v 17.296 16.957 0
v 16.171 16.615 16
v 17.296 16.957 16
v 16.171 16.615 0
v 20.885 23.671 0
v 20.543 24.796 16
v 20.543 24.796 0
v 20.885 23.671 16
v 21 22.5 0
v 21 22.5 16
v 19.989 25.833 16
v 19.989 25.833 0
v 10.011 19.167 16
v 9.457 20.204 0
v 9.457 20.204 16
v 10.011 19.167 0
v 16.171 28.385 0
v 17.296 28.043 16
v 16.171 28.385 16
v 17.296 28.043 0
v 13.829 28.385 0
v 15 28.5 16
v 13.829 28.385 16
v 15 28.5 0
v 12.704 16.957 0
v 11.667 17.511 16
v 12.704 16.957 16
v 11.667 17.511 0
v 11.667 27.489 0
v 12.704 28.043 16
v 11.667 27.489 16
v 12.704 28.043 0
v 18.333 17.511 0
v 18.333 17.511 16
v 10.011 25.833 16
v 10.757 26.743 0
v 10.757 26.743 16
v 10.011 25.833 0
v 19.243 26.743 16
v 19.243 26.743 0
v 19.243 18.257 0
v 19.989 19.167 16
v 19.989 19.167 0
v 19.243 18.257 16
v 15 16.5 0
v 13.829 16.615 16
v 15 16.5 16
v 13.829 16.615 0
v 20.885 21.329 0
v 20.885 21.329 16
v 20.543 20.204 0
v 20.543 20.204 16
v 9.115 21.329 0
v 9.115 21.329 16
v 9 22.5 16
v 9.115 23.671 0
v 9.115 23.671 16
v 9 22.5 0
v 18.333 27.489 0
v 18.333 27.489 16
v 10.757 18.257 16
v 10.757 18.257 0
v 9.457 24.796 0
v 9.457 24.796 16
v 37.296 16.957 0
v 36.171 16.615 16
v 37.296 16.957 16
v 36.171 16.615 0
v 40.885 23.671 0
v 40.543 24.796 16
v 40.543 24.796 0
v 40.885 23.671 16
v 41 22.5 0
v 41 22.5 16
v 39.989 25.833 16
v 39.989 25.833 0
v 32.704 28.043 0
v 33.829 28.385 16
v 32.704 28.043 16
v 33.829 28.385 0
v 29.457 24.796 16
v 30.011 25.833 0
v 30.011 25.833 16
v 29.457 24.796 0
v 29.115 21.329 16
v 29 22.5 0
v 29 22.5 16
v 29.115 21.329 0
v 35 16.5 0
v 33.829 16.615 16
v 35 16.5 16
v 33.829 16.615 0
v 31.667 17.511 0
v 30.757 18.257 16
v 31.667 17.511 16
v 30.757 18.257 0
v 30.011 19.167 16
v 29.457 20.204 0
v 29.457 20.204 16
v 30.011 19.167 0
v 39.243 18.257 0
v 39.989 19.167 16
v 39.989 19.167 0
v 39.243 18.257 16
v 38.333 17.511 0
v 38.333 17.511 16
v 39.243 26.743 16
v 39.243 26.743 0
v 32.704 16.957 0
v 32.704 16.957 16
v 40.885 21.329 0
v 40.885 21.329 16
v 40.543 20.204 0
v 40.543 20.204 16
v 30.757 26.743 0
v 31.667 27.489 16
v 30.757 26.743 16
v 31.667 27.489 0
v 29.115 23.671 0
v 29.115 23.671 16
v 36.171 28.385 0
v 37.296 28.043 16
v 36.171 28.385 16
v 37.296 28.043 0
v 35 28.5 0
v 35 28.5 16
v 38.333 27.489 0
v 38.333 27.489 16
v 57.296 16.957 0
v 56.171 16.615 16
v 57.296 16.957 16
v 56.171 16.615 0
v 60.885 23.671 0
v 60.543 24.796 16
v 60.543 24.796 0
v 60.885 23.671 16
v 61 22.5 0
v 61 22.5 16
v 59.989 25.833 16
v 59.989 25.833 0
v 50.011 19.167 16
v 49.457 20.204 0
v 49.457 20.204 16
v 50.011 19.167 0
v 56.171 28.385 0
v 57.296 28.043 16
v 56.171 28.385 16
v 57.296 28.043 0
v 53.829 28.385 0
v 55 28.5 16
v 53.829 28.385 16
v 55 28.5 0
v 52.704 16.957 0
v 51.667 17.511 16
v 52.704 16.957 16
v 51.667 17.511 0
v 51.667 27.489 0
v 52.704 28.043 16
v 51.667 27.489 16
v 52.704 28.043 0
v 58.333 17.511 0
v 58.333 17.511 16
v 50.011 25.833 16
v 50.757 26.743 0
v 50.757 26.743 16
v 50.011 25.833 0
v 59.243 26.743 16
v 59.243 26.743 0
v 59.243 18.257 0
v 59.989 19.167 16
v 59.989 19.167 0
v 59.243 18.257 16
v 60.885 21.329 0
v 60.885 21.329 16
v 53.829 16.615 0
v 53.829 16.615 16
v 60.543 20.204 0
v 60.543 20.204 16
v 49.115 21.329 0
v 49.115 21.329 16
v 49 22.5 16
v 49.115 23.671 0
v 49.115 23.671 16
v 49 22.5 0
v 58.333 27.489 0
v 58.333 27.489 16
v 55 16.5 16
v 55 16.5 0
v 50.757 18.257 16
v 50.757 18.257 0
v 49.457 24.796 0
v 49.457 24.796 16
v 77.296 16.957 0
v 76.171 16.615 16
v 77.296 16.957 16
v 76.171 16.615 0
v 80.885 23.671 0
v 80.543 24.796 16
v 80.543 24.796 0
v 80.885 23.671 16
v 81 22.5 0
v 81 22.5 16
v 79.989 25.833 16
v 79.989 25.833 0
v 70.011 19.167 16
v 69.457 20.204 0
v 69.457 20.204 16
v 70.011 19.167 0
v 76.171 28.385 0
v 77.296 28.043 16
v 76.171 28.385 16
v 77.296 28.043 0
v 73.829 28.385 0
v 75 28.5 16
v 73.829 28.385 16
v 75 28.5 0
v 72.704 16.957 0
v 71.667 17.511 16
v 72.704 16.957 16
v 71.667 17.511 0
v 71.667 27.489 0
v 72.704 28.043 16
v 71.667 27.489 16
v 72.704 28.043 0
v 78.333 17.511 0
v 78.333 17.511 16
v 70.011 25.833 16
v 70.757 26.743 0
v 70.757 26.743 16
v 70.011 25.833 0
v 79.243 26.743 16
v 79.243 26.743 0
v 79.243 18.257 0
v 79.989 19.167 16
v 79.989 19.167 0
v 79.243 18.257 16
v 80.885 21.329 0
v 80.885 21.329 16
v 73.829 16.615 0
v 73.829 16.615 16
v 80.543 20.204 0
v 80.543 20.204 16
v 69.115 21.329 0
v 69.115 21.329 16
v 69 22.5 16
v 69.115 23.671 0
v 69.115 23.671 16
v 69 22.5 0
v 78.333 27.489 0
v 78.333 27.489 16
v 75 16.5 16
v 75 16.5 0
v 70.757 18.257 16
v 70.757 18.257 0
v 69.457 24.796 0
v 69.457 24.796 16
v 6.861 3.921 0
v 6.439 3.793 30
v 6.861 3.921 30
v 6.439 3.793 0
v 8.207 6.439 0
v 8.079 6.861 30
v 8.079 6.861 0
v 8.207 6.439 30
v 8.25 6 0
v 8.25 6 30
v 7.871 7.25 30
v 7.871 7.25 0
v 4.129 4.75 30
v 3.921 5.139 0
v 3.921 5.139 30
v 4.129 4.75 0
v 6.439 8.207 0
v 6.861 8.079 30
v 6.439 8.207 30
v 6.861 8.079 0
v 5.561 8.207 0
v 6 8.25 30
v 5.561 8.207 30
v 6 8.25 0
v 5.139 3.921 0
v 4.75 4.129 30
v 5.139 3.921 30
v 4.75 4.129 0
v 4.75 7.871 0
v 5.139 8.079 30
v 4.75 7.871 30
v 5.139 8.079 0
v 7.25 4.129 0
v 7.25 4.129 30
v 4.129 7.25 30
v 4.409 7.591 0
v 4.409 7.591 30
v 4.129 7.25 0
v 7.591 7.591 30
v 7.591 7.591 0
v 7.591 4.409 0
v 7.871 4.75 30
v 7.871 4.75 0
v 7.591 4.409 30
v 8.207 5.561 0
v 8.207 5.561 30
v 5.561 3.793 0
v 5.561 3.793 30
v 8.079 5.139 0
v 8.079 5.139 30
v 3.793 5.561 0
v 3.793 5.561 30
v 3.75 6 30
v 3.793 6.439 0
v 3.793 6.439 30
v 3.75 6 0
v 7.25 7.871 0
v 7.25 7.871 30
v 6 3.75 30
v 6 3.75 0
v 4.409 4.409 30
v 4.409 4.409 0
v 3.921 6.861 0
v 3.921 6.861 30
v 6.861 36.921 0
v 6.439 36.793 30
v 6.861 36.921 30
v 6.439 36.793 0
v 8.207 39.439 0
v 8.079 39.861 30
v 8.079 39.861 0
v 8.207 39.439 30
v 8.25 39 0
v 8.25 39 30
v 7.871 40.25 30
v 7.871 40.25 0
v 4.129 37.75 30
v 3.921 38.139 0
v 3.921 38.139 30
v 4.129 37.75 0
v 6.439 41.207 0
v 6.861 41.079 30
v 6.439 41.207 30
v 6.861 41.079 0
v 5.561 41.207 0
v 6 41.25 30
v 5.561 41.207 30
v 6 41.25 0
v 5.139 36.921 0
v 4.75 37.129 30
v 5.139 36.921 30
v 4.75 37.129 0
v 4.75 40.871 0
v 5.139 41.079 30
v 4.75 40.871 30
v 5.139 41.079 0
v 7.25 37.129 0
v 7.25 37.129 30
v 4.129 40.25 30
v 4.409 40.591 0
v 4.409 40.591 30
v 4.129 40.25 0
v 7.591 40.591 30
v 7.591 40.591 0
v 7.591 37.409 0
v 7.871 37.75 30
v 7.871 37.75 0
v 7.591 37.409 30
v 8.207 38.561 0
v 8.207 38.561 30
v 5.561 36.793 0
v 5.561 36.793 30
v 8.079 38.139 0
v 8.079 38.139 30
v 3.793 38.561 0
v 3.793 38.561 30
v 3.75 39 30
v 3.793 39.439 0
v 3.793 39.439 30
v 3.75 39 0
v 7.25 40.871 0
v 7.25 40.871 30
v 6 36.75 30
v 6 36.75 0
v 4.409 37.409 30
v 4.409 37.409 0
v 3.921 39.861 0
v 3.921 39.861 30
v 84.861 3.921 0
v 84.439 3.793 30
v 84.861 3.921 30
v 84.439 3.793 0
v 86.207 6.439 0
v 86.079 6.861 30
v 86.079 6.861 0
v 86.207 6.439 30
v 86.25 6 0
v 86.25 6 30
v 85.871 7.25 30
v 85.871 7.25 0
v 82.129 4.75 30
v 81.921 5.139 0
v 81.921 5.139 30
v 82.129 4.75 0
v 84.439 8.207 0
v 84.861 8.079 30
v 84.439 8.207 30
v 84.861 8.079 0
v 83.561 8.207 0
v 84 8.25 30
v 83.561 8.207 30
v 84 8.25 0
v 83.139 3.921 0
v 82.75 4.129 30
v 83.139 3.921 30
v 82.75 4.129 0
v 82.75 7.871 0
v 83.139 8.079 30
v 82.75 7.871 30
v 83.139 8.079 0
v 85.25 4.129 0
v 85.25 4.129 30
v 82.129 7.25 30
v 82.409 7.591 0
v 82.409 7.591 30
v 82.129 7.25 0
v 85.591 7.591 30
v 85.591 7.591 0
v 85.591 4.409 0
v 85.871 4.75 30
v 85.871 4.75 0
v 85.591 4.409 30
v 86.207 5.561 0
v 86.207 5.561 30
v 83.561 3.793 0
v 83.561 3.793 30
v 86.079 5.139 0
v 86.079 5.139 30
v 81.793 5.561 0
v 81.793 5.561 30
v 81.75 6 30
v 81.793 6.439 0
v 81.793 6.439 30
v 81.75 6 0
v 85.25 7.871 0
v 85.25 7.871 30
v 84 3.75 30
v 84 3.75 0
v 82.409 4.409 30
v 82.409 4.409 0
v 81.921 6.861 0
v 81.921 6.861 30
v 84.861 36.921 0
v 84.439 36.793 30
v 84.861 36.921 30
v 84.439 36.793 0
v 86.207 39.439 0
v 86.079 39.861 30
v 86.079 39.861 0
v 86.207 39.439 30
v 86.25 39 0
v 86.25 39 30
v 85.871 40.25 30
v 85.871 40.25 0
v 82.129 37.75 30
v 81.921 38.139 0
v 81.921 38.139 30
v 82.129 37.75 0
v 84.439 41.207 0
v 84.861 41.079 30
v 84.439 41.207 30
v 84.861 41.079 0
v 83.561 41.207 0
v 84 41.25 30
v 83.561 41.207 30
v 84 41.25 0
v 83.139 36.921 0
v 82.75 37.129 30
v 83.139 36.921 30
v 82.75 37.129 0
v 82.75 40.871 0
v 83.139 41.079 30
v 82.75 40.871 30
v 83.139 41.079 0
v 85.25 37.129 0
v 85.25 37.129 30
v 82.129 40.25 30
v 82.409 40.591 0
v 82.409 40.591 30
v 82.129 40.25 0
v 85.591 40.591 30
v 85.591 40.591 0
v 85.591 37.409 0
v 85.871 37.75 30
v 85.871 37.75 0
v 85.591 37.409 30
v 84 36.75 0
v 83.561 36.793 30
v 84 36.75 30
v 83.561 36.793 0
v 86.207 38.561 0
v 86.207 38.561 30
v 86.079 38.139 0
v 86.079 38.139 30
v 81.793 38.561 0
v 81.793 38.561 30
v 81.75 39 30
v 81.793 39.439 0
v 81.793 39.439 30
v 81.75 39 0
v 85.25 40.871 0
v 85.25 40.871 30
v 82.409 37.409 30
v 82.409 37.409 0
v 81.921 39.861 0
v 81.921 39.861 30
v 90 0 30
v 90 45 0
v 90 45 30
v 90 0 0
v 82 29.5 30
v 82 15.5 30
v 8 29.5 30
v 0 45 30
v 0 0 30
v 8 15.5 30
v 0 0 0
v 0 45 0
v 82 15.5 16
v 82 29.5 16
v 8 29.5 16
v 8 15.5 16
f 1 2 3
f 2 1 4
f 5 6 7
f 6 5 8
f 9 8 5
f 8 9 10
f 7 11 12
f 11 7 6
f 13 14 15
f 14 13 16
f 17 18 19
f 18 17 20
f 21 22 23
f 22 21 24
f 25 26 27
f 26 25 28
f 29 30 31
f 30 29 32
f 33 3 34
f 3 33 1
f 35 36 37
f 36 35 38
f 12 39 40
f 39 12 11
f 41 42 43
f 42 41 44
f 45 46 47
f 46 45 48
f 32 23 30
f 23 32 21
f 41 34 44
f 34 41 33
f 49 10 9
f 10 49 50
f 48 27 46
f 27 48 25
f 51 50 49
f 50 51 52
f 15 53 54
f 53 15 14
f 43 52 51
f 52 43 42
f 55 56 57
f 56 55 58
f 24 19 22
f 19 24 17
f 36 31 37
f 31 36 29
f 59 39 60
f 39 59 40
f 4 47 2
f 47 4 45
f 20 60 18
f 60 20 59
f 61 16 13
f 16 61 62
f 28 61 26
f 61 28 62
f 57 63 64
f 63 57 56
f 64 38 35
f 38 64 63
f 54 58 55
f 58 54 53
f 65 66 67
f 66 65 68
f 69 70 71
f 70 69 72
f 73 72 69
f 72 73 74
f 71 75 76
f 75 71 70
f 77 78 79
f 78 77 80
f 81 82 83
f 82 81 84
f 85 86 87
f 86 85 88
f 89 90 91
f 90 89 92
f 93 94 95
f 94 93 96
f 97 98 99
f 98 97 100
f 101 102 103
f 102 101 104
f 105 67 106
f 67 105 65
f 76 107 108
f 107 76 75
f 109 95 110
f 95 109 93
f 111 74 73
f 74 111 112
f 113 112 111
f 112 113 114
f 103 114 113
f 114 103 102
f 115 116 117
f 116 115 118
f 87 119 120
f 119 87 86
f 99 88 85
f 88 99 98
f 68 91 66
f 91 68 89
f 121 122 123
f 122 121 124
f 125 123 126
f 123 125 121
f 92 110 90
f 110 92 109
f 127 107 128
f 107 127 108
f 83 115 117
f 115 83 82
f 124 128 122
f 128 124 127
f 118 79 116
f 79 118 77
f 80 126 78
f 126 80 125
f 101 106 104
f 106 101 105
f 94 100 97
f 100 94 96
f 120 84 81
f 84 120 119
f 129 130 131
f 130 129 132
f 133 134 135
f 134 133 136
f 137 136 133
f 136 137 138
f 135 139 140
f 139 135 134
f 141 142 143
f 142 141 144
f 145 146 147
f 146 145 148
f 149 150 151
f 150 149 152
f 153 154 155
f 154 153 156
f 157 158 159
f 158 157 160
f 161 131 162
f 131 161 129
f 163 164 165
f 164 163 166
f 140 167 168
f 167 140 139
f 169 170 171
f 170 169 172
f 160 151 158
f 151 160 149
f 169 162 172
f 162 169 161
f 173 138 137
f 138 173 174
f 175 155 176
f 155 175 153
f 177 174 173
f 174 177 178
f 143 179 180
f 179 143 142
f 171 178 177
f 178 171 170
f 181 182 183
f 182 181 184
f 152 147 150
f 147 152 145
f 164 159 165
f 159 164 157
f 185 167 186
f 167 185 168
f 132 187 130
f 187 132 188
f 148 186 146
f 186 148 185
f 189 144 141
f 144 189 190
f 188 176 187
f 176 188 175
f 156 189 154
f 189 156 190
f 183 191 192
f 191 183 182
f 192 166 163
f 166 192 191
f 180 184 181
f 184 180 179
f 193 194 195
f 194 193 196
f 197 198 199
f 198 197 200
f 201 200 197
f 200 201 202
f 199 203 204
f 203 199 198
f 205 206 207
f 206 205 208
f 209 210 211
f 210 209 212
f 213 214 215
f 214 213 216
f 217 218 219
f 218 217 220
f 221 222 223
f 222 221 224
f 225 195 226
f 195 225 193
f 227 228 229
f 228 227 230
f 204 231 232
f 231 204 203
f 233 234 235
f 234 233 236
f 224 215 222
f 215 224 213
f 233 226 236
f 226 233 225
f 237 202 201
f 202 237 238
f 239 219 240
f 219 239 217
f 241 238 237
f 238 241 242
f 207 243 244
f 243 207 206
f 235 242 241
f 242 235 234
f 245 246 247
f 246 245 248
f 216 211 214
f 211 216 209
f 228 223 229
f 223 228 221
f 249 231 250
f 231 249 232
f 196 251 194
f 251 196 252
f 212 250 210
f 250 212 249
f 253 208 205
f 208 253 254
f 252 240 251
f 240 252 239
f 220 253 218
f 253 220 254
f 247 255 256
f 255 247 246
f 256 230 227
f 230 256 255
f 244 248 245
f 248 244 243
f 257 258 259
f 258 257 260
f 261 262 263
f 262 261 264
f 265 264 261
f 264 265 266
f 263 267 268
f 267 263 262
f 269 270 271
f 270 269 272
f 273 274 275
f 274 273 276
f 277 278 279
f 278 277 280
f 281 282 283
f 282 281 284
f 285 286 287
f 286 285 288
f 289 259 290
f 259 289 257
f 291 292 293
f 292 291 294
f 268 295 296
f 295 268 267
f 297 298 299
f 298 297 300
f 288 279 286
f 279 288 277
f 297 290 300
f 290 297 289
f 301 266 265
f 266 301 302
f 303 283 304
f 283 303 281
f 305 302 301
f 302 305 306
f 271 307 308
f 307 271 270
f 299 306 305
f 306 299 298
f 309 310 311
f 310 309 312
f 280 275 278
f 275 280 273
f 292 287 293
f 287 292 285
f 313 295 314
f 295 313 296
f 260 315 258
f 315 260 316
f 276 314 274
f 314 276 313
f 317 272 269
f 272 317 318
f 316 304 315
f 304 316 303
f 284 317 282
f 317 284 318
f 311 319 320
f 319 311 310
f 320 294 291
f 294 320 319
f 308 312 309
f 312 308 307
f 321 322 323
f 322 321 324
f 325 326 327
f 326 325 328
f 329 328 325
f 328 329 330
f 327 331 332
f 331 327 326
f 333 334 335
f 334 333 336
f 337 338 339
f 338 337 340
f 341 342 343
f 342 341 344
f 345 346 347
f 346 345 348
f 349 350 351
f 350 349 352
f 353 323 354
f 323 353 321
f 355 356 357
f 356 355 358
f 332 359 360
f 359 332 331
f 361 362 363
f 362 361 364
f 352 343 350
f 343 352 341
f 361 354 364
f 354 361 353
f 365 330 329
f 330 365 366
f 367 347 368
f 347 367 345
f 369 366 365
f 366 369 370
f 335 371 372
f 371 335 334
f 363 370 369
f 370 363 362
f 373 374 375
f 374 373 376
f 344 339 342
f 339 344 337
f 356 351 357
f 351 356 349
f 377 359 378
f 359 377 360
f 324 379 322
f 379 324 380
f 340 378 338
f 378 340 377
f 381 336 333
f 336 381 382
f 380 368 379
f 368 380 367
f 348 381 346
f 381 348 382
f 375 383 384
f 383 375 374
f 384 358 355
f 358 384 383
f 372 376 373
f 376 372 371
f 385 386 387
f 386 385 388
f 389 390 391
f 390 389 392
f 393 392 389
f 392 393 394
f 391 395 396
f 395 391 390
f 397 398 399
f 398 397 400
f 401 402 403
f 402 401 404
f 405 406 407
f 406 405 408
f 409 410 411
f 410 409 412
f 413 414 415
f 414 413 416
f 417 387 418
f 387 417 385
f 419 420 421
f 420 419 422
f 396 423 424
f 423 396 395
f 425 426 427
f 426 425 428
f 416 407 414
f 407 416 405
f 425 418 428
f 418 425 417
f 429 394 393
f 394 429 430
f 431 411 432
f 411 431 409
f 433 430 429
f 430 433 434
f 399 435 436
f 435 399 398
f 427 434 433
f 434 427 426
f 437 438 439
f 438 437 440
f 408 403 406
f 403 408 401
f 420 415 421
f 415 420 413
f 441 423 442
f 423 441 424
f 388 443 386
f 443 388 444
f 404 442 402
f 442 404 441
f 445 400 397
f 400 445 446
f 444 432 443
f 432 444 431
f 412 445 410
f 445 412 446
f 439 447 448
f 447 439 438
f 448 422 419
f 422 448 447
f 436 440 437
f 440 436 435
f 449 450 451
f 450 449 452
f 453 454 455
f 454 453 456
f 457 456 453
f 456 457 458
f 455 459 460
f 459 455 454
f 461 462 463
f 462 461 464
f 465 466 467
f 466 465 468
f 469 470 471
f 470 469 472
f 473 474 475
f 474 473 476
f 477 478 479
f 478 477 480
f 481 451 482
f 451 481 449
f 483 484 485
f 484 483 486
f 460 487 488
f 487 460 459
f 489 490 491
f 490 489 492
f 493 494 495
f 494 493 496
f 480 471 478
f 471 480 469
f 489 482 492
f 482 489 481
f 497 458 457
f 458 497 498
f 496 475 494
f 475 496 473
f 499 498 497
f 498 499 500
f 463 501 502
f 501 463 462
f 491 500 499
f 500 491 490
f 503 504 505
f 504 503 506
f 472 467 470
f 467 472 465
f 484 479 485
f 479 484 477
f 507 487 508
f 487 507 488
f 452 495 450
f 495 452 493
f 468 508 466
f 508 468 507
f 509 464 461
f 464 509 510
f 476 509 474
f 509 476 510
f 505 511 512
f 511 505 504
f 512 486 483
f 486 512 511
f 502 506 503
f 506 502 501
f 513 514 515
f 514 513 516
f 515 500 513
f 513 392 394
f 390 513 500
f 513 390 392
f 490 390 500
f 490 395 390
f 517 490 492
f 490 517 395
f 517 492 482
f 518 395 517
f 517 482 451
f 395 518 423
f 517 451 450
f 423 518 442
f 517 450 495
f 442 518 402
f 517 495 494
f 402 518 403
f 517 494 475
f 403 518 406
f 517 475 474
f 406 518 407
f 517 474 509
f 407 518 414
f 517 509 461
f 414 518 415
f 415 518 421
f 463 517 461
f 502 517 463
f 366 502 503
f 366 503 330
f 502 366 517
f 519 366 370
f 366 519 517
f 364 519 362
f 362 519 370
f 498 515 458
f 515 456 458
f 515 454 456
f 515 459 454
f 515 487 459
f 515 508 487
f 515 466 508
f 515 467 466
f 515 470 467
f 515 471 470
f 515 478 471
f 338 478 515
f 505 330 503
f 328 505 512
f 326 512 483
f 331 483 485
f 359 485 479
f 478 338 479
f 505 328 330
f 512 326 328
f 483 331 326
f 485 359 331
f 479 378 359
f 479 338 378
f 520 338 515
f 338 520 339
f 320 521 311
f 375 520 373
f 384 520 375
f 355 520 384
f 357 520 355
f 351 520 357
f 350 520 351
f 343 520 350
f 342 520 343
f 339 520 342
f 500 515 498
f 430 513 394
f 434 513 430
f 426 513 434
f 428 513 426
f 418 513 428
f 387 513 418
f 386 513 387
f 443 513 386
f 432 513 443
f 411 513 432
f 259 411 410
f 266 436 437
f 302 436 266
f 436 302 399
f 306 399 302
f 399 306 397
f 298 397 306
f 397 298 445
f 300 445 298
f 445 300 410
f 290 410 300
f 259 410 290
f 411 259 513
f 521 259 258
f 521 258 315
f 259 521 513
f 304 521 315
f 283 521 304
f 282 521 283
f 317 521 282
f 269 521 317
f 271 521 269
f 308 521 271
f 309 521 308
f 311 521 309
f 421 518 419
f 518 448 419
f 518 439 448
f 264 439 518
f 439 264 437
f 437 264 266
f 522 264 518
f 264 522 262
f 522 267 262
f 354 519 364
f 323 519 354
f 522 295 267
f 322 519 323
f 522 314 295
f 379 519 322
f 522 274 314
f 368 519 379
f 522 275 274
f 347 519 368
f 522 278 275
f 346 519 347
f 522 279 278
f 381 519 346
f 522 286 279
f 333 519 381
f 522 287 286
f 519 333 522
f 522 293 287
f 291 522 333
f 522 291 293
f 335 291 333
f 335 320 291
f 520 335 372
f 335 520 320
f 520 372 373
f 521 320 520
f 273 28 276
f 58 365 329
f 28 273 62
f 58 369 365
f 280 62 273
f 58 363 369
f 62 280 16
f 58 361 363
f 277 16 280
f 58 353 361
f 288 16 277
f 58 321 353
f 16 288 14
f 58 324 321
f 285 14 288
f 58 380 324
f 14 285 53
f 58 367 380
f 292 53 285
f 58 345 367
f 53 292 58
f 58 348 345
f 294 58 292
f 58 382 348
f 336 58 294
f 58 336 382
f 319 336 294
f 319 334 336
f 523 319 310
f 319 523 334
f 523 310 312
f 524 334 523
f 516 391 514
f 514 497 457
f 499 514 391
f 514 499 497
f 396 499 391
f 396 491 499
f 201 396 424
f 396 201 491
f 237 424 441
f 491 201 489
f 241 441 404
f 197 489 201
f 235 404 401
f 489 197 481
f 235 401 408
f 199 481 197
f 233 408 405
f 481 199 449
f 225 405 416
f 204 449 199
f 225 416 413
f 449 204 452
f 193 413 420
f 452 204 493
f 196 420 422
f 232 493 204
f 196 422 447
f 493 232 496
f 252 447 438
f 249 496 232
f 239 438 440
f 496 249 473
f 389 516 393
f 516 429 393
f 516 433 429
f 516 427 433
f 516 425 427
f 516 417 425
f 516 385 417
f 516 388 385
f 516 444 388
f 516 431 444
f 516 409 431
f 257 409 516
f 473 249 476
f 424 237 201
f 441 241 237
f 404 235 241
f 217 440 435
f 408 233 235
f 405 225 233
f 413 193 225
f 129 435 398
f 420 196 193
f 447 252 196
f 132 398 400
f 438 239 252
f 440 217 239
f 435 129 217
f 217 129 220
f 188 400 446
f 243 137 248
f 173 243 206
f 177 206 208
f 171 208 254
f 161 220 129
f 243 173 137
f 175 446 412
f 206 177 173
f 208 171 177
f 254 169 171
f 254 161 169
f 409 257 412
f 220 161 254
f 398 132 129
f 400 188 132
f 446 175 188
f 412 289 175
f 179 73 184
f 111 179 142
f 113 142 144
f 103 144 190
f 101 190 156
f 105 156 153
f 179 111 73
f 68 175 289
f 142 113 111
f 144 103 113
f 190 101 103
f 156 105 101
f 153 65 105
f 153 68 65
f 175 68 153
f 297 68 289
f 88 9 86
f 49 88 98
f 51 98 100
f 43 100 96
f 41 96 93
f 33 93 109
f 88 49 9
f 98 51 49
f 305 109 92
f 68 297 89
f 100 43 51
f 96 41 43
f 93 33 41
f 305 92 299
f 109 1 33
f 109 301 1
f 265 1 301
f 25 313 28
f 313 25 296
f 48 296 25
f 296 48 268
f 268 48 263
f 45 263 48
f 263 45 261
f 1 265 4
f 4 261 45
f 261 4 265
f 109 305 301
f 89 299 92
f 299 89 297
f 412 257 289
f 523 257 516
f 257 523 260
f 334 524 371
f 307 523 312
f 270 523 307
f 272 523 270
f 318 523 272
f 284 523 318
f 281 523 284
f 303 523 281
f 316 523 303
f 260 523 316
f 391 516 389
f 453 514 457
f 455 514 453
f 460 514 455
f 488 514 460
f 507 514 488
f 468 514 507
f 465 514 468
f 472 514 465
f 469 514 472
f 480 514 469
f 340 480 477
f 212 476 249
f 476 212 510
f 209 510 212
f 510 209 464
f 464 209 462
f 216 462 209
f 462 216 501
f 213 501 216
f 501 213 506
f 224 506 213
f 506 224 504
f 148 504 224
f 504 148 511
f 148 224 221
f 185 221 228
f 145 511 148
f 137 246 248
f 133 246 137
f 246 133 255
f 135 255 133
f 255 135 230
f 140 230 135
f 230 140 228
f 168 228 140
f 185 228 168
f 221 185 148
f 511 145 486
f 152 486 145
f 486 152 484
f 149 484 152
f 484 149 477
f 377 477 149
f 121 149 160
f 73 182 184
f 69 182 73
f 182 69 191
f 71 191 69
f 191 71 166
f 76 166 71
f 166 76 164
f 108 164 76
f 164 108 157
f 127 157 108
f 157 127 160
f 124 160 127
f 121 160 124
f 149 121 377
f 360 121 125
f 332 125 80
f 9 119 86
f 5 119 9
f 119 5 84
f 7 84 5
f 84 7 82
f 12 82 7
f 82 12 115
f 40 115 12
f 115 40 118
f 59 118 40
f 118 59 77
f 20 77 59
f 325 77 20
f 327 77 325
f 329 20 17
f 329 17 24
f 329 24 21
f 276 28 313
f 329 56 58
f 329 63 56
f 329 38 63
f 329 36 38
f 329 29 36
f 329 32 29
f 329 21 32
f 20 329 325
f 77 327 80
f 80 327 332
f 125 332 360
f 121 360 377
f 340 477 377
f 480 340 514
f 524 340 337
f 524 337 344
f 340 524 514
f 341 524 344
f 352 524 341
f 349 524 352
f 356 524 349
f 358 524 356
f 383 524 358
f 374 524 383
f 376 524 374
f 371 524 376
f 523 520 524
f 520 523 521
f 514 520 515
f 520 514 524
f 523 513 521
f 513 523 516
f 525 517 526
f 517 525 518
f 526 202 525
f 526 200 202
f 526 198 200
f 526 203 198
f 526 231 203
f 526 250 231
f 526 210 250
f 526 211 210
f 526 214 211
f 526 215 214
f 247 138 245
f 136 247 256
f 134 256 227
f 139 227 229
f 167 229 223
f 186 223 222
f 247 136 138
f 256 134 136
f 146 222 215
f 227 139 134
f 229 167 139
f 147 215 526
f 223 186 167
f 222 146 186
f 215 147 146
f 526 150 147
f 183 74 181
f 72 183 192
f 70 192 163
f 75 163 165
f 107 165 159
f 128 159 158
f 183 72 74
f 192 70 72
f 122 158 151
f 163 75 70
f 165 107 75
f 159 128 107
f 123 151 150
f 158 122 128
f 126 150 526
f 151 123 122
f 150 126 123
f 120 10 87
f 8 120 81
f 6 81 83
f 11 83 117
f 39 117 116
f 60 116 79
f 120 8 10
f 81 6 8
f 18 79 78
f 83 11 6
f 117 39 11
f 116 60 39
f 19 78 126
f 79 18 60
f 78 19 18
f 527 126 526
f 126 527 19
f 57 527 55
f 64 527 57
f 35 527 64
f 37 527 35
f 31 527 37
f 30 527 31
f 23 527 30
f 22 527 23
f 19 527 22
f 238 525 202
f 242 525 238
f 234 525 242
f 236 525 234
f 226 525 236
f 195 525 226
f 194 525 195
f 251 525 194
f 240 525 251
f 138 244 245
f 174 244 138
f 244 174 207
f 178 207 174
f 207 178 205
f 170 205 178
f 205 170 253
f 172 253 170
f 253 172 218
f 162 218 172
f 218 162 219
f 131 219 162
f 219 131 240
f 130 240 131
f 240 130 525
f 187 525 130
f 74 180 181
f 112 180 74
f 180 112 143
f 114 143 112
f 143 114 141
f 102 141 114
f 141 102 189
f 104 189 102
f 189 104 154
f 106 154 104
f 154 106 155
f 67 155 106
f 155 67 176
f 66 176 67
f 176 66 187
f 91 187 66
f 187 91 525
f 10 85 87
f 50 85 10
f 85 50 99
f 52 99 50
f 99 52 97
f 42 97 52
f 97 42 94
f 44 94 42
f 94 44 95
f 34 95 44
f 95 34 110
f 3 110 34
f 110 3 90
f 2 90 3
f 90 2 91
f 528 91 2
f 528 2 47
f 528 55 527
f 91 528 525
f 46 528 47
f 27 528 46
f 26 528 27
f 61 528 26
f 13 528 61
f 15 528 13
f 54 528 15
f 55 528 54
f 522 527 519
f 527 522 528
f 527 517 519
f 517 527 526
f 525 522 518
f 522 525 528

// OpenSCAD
$fn = 32;

// ----------------------------------------------------------------------
// Manifold block: gallery_top manifold
// ----------------------------------------------------------------------

// --- parameters (mm) ---
block_l = 90;             // block length, X
block_w = 45;             // block width, Y
block_h = 30;             // block height, Z
port_d = 12;              // port bore diameter
port_pitch = 20;          // port pitch along X
gallery_d = 14;           // top gallery width, Y
gallery_depth = 14;       // gallery pocket depth
wall_p = 8;               // gallery end wall thickness, X
mnt_d = 4.5;              // mounting hole diameter
mnt_in = 6;               // mounting hole inset from the edges

n_ports = 4;  // ports in the row
port_x0 = (block_l - (n_ports - 1) * port_pitch) / 2;  // first port X

difference() {
  cube([block_l, block_w, block_h]);
  for (i = [0 : n_ports - 1])
    translate([port_x0 + i * port_pitch, block_w / 2, -1])
      cylinder(h = block_h + 2, d = port_d);
  translate([wall_p, block_w / 2 - gallery_d / 2, block_h - gallery_depth])
    cube([block_l - 2 * wall_p, gallery_d, gallery_depth + 1]);
  for (cx = [mnt_in, block_l - mnt_in])
    for (cy = [mnt_in, block_w - mnt_in])
      translate([cx, cy, -1]) cylinder(h = block_h + 2, d = mnt_d);
}
